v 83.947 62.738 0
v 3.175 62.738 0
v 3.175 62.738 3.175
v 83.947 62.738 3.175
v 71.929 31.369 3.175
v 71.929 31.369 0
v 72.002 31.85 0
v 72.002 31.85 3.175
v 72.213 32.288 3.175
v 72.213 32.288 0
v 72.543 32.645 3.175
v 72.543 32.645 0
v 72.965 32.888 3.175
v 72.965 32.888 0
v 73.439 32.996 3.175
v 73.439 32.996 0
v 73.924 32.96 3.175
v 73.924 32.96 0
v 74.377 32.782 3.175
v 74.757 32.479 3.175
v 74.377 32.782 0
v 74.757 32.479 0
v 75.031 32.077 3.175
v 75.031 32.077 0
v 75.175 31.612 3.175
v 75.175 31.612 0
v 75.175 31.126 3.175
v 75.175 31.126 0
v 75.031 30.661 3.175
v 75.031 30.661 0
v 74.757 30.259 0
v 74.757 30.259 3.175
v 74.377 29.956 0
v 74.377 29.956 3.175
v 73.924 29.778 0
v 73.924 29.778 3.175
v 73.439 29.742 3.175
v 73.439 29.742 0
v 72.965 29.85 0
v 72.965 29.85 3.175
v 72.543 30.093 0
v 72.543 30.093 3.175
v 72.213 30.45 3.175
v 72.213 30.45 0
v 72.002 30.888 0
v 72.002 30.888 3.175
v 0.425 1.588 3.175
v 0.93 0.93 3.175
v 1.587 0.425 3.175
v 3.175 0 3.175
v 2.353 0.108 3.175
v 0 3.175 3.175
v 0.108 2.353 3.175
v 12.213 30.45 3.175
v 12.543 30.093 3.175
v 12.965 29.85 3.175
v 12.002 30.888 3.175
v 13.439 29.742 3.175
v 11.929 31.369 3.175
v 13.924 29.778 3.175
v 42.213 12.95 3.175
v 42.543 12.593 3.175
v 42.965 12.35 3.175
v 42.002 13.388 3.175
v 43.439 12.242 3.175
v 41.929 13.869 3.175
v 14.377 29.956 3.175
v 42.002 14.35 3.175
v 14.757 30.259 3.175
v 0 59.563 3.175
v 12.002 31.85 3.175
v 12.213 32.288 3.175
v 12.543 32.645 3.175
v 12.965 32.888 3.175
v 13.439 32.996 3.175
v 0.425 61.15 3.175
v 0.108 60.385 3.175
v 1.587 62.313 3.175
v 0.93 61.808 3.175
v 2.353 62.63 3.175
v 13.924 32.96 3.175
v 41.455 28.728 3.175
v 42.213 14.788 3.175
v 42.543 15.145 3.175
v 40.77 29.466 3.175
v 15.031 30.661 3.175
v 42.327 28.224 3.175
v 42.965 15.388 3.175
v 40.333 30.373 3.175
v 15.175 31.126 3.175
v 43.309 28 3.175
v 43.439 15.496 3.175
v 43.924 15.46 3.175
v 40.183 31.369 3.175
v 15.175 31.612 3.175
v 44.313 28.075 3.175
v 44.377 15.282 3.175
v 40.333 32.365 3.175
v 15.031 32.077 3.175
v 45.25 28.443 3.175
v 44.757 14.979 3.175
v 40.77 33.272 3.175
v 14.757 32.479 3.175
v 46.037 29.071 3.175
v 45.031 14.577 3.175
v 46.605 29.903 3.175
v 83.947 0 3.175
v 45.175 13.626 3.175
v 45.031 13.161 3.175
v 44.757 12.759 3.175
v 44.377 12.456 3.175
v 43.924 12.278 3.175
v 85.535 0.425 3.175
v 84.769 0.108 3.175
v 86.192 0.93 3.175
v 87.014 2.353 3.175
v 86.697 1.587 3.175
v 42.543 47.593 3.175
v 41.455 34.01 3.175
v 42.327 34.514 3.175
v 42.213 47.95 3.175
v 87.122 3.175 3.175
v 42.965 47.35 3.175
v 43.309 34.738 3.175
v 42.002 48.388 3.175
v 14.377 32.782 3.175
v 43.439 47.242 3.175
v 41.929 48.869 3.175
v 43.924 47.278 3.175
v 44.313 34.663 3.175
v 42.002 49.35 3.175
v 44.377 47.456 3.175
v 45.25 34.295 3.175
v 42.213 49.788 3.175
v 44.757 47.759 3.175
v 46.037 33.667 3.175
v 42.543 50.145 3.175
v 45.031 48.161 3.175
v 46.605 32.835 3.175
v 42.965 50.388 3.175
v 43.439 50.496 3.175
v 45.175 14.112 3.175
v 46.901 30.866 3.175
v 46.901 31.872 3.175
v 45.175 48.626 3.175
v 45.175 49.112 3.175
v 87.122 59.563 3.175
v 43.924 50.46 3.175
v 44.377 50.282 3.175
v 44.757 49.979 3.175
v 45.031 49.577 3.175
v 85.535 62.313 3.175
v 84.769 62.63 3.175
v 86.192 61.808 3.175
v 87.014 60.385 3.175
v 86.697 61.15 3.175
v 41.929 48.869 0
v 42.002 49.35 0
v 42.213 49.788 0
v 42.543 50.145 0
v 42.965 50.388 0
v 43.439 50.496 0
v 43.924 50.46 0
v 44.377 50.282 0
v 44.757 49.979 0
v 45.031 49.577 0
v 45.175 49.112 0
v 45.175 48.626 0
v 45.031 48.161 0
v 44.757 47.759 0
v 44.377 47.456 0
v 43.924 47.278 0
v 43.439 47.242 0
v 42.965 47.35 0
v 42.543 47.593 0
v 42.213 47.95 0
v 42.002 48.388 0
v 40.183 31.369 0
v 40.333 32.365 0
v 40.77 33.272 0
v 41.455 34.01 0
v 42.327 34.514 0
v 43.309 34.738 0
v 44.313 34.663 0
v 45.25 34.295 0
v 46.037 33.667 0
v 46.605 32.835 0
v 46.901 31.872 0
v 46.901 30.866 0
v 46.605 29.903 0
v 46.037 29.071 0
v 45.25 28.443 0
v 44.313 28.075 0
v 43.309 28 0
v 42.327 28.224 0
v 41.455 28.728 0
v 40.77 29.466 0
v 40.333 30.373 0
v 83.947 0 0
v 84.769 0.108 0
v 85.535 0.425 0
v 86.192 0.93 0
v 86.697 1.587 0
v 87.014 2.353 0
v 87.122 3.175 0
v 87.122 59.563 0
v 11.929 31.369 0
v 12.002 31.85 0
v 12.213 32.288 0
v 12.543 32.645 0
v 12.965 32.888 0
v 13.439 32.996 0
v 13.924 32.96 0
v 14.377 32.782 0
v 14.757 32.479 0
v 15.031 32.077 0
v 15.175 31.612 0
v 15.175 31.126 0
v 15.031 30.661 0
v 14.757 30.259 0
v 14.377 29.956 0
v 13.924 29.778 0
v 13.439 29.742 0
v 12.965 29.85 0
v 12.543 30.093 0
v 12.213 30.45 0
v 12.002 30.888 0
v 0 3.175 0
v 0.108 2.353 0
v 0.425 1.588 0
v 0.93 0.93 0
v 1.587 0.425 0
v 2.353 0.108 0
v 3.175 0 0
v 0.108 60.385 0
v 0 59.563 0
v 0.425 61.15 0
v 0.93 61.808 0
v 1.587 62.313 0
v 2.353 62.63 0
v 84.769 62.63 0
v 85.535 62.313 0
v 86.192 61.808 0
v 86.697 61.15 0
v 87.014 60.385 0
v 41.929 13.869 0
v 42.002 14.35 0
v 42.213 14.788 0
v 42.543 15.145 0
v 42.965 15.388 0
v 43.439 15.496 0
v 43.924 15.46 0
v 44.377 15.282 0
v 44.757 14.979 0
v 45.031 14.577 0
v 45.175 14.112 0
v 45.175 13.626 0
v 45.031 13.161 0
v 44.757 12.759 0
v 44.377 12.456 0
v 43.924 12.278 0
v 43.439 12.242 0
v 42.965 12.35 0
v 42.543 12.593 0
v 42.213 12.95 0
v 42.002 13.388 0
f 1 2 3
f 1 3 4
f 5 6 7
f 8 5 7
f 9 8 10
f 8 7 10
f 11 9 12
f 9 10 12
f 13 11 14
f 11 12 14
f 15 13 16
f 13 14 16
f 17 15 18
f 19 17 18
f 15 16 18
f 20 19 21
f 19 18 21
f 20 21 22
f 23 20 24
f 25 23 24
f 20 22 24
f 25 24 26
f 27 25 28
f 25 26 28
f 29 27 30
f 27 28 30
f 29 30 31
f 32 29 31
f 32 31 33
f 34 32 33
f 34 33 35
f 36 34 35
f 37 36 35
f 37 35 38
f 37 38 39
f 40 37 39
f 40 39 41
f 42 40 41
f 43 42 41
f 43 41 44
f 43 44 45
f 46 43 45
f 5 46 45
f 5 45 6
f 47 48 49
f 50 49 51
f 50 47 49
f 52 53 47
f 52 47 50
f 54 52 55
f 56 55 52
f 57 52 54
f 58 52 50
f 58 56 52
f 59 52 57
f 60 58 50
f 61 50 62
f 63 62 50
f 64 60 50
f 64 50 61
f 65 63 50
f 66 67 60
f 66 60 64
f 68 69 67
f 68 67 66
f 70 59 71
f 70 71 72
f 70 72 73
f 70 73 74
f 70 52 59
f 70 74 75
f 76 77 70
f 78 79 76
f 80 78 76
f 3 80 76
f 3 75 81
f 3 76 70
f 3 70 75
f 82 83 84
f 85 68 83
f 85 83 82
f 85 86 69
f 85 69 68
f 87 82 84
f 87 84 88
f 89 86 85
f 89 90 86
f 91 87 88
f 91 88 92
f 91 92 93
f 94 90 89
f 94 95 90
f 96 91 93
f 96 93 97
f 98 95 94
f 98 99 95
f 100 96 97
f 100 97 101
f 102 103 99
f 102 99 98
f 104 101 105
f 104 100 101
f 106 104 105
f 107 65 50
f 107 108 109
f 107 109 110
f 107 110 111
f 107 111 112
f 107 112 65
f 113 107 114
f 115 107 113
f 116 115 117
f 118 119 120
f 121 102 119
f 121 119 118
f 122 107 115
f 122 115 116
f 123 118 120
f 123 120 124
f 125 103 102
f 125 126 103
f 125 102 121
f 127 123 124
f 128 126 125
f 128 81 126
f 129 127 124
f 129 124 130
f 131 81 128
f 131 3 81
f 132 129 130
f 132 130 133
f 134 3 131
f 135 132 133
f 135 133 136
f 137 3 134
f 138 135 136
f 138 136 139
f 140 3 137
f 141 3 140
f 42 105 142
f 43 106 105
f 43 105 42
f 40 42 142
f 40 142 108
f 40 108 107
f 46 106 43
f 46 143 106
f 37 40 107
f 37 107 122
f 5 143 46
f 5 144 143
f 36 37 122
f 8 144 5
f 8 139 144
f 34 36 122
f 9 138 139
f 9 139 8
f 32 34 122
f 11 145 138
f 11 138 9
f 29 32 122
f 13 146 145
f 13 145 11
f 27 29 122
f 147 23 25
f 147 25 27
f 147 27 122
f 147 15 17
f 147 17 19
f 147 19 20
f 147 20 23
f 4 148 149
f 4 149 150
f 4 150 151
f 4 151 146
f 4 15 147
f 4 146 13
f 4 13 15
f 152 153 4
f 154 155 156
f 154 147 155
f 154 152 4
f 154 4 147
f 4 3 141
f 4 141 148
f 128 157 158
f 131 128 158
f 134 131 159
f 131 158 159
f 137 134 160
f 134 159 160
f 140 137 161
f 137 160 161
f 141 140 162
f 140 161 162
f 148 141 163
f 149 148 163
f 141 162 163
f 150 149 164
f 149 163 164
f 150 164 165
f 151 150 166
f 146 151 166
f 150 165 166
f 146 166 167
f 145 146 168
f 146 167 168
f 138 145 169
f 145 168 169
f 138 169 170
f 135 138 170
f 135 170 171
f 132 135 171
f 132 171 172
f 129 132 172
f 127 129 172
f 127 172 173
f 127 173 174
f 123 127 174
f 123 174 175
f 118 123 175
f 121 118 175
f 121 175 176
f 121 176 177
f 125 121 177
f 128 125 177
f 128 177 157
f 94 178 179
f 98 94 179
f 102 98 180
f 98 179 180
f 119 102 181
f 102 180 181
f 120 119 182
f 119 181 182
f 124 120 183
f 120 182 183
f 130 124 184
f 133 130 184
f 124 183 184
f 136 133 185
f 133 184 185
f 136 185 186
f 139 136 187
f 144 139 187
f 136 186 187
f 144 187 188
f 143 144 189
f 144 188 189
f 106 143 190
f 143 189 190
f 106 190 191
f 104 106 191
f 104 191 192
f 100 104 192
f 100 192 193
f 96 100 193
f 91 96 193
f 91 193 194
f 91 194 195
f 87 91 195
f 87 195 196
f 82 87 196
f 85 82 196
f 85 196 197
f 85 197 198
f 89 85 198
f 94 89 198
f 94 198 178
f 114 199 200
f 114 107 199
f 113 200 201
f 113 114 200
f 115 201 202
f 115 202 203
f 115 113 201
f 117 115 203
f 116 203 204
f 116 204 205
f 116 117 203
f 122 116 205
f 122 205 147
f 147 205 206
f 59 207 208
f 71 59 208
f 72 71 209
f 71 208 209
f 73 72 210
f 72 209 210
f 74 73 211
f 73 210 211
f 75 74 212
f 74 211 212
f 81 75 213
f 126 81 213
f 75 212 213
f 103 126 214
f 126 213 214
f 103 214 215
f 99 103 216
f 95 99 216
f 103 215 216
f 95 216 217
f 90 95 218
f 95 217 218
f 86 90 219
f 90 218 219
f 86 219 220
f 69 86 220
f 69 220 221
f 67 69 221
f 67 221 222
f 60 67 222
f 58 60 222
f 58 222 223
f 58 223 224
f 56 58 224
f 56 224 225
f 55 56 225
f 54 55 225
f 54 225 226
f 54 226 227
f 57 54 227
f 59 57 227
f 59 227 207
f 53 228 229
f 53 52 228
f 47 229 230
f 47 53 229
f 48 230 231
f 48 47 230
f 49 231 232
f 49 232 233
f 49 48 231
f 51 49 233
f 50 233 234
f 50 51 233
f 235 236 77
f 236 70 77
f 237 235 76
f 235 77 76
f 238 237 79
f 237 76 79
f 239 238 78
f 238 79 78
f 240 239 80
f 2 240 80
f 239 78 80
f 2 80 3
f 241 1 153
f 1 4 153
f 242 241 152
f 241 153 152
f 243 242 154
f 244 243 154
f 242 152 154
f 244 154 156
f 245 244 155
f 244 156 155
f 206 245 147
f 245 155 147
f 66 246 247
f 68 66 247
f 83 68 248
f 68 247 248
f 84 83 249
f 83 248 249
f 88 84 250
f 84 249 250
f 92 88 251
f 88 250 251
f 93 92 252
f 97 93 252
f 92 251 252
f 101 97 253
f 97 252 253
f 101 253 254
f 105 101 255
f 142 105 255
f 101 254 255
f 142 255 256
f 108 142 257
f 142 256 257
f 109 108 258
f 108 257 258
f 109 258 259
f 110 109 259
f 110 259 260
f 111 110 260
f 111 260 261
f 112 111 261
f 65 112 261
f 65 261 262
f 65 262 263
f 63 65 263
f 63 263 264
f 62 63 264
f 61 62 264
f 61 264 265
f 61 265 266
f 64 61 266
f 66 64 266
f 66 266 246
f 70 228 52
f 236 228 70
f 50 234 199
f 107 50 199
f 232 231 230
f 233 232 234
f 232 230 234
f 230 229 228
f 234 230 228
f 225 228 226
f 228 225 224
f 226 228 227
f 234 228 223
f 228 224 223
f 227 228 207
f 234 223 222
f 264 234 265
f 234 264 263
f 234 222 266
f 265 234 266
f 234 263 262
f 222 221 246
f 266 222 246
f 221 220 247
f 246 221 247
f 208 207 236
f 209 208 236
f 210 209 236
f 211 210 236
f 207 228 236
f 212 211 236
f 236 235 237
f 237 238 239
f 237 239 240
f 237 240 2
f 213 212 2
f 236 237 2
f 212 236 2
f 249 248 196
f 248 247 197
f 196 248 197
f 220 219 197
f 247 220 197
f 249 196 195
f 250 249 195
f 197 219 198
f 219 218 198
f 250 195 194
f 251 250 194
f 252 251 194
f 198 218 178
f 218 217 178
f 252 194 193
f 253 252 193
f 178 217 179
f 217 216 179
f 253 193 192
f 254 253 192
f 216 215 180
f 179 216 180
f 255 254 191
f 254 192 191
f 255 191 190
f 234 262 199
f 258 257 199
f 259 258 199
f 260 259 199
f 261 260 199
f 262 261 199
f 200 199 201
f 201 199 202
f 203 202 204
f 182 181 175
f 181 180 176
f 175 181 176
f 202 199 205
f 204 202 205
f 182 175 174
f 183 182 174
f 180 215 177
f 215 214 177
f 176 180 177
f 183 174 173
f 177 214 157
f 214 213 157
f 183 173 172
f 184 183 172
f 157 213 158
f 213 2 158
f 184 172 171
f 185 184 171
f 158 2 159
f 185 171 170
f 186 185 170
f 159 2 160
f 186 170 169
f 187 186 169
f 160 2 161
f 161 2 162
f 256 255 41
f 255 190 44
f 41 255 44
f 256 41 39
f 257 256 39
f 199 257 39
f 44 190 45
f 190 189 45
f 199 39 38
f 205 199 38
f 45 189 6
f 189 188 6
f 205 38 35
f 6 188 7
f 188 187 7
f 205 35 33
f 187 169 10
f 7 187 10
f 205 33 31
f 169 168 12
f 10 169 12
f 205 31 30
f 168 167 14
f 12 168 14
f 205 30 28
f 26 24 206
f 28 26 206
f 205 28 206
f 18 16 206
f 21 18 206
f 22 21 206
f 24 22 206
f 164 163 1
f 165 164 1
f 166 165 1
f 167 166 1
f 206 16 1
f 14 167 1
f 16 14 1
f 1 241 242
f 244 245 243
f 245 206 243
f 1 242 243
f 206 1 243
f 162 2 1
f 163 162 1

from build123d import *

# Parameters (mm, degrees)
SKETCH1_W               = 87.122
SKETCH1_H               = 62.738
BOSS_EXTRUDE1_DEPTH     = 3.175
F_4_CLEARANCE_HOLE1_D   = 3.2639
F_1_4_CLEARANCE_HOLE1_D = 6.7564
FILLET1_R               = 3.175


with BuildPart() as part:
    # Sketch1 → Boss-Extrude1 (new body)
    with BuildSketch(Plane.XY):
        with Locations((43.561, 31.369)):
            Rectangle(SKETCH1_W, SKETCH1_H)
    extrude(amount=BOSS_EXTRUDE1_DEPTH)

    # #4 Clearance Hole1 (through all)
    with Locations(Plane.XY.offset(3.175)):
        with Locations((43.561, 13.869), (73.561, 31.369), (13.561, 31.369), (43.561, 48.869)):
            Hole(F_4_CLEARANCE_HOLE1_D / 2)

    # 1/4 Clearance Hole1 (through all)
    with Locations(Plane.XY.offset(3.175)):
        with Locations((43.561, 31.369)):
            Hole(F_1_4_CLEARANCE_HOLE1_D / 2)

    # Fillet1
    fillet1_edges = [part.edges().sort_by_distance(p)[0] for p in [
        (0, 62.738, 1.5875),
        (87.122, 62.738, 1.5875),
        (87.122, 0, 1.5875),
        (0, 0, 1.5875),
    ]]
    fillet(fillet1_edges, radius=FILLET1_R)


solid = part.part
